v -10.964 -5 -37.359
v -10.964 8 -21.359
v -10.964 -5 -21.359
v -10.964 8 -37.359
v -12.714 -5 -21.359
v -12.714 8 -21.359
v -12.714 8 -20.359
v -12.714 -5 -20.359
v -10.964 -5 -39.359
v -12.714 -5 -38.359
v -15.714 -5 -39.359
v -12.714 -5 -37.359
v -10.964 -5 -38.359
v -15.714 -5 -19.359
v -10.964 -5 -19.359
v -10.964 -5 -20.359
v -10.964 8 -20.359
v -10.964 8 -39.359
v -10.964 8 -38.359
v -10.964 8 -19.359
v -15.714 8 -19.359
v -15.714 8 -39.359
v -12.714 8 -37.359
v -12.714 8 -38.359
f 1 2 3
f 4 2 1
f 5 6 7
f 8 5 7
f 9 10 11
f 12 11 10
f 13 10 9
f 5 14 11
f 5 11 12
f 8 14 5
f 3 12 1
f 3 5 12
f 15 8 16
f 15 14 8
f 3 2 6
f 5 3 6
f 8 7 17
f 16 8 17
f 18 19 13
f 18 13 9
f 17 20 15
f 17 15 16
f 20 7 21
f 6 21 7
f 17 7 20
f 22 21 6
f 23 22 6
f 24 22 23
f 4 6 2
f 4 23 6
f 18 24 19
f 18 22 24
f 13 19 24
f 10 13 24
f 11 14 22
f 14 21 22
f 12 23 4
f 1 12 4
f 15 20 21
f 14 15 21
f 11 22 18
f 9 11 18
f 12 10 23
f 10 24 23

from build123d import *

# Parameters (mm, degrees)
SALIENTE_EXTRUIR3_DEPTH = 10
CROQUIS4_W              = 20
CROQUIS4_H              = 5
SALIENTE_EXTRUIR4_DEPTH = 10
CROQUIS5_W              = 5
CROQUIS5_H              = 5
SALIENTE_EXTRUIR5_DEPTH = 20
CORTAR_EXTRUIR1_DEPTH   = 2
CROQUIS8_W              = 20
CROQUIS8_H              = 5
CORTAR_EXTRUIR2_DEPTH   = 2
CROQUIS9_W              = 5
CROQUIS9_H              = 20
CORTAR_EXTRUIR3_DEPTH   = 2
CROQUIS10_W             = 20
CROQUIS10_H             = 5
CORTAR_EXTRUIR5_DEPTH   = 35
SALIENTE_EXTRUIR6_DEPTH = 5
CROQUIS12_W             = 26.103344273
CROQUIS12_H             = 18.453448341
CORTAR_EXTRUIR6_DEPTH   = 0.25


with BuildPart() as part:
    # Croquis1 → Saliente-Extruir3 (new body)
    with BuildSketch(Plane(origin=(0, 0, 0), x_dir=(1, 0, 0), z_dir=(0, 1, 0))):
        Polygon((-12.713671106, 38.358548308), (-10.713671106, 38.358548308), (-10.713671106, 39.358548308), (-15.713671106, 39.358548308), (-15.713671106, 19.358548308), (-10.713671106, 19.358548308), (-10.713671106, 20.358548308), (-12.713671106, 20.358548308), (-12.713671106, 21.358548308), (-10.718625385, 21.358548308), (-10.718625385, 37.358548308), (-12.713671106, 37.358548308), align=None)
    extrude(amount=SALIENTE_EXTRUIR3_DEPTH)



with BuildPart() as body_2:
    # Croquis4 → Saliente-Extruir4 (new body)
    with BuildSketch(Plane(origin=(-10.713671106, 0, 0), x_dir=(0, 0, -1), z_dir=(1, 0, 0))):
        with Locations((29.358548308, -2.5)):
            Rectangle(CROQUIS4_W, CROQUIS4_H)
    extrude(amount=SALIENTE_EXTRUIR4_DEPTH)


with BuildPart() as part_1:
    add(part.part)

    add(body_2.part)  # Saliente-Extruir5 merges body 2
    # Croquis5 → Saliente-Extruir5 (add)
    with BuildSketch(Plane.XY.offset(-19.358548308)):
        with Locations((-13.213671106, -2.5)):
            Rectangle(CROQUIS5_W, CROQUIS5_H)
    extrude(amount=-SALIENTE_EXTRUIR5_DEPTH)

    # Croquis7 → Cortar-Extruir1 (cut)
    with BuildSketch(Plane(origin=(0, 0, 0), x_dir=(1, 0, 0), z_dir=(0, 1, 0))):
        Polygon((-10.714909676, 37.358548308), (-0.713671106, 37.358548308), (-0.713671106, 38.358548308), (-10.713671106, 38.358548308), (-12.713671106, 38.358548308), (-12.713671106, 37.358548308), align=None)
        Polygon((-10.713671106, 20.358548308), (-0.713671106, 20.358548308), (-0.713671106, 21.358548308), (-10.714909676, 21.358548308), (-12.713671106, 21.358548308), (-12.713671106, 20.358548308), align=None)
    extrude(amount=-CORTAR_EXTRUIR1_DEPTH, mode=Mode.SUBTRACT)

    # Croquis8 → Cortar-Extruir2 (cut)
    with BuildSketch(Plane(origin=(-0.713671106, 0, 0), x_dir=(0, 0, -1), z_dir=(1, 0, 0))):
        with Locations((29.358548308, -2.5)):
            Rectangle(CROQUIS8_W, CROQUIS8_H)
    extrude(amount=-CORTAR_EXTRUIR2_DEPTH, mode=Mode.SUBTRACT)

    # Croquis9 → Cortar-Extruir3 (cut)
    with BuildSketch(Plane(origin=(0, 10, 0), x_dir=(1, 0, 0), z_dir=(0, 1, 0))):
        with Locations((-13.213671106, 29.358548308)):
            Rectangle(CROQUIS9_W, CROQUIS9_H)
    extrude(amount=-CORTAR_EXTRUIR3_DEPTH, mode=Mode.SUBTRACT)

    # Croquis10 → Cortar-Extruir5 (cut)
    with BuildSketch(Plane(origin=(-2.713671106, 0, 0), x_dir=(0, 0, -1), z_dir=(1, 0, 0))):
        with Locations((29.358548308, -2.5)):
            Rectangle(CROQUIS10_W, CROQUIS10_H)
    extrude(amount=-CORTAR_EXTRUIR5_DEPTH, mode=Mode.SUBTRACT)

    # Croquis11 → Saliente-Extruir6 (add)
    with BuildSketch(Plane.XZ):
        Polygon((-10.713671106, -20.358548308), (-10.713671106, -19.358548308), (-15.713671106, -19.358548308), (-15.713671106, -39.358548308), (-10.713671106, -39.358548308), (-10.713671106, -38.358548308), (-12.713671106, -38.358548308), (-12.713671106, -37.358548308), (-10.716767531, -37.358548308), (-10.717696458, -21.358548308), (-12.713671106, -21.358548308), (-12.713671106, -20.358548308), align=None)
    extrude(amount=SALIENTE_EXTRUIR6_DEPTH)

    # Croquis12 → Cortar-Extruir6 (cut)
    with BuildSketch(Plane(origin=(-10.713671106, 0, 0), x_dir=(0, 0, -1), z_dir=(1, 0, 0))):
        with Locations((28.040672231, 2.092138624)):
            Rectangle(CROQUIS12_W, CROQUIS12_H)
    extrude(amount=-CORTAR_EXTRUIR6_DEPTH, mode=Mode.SUBTRACT)


solid = part_1.part
